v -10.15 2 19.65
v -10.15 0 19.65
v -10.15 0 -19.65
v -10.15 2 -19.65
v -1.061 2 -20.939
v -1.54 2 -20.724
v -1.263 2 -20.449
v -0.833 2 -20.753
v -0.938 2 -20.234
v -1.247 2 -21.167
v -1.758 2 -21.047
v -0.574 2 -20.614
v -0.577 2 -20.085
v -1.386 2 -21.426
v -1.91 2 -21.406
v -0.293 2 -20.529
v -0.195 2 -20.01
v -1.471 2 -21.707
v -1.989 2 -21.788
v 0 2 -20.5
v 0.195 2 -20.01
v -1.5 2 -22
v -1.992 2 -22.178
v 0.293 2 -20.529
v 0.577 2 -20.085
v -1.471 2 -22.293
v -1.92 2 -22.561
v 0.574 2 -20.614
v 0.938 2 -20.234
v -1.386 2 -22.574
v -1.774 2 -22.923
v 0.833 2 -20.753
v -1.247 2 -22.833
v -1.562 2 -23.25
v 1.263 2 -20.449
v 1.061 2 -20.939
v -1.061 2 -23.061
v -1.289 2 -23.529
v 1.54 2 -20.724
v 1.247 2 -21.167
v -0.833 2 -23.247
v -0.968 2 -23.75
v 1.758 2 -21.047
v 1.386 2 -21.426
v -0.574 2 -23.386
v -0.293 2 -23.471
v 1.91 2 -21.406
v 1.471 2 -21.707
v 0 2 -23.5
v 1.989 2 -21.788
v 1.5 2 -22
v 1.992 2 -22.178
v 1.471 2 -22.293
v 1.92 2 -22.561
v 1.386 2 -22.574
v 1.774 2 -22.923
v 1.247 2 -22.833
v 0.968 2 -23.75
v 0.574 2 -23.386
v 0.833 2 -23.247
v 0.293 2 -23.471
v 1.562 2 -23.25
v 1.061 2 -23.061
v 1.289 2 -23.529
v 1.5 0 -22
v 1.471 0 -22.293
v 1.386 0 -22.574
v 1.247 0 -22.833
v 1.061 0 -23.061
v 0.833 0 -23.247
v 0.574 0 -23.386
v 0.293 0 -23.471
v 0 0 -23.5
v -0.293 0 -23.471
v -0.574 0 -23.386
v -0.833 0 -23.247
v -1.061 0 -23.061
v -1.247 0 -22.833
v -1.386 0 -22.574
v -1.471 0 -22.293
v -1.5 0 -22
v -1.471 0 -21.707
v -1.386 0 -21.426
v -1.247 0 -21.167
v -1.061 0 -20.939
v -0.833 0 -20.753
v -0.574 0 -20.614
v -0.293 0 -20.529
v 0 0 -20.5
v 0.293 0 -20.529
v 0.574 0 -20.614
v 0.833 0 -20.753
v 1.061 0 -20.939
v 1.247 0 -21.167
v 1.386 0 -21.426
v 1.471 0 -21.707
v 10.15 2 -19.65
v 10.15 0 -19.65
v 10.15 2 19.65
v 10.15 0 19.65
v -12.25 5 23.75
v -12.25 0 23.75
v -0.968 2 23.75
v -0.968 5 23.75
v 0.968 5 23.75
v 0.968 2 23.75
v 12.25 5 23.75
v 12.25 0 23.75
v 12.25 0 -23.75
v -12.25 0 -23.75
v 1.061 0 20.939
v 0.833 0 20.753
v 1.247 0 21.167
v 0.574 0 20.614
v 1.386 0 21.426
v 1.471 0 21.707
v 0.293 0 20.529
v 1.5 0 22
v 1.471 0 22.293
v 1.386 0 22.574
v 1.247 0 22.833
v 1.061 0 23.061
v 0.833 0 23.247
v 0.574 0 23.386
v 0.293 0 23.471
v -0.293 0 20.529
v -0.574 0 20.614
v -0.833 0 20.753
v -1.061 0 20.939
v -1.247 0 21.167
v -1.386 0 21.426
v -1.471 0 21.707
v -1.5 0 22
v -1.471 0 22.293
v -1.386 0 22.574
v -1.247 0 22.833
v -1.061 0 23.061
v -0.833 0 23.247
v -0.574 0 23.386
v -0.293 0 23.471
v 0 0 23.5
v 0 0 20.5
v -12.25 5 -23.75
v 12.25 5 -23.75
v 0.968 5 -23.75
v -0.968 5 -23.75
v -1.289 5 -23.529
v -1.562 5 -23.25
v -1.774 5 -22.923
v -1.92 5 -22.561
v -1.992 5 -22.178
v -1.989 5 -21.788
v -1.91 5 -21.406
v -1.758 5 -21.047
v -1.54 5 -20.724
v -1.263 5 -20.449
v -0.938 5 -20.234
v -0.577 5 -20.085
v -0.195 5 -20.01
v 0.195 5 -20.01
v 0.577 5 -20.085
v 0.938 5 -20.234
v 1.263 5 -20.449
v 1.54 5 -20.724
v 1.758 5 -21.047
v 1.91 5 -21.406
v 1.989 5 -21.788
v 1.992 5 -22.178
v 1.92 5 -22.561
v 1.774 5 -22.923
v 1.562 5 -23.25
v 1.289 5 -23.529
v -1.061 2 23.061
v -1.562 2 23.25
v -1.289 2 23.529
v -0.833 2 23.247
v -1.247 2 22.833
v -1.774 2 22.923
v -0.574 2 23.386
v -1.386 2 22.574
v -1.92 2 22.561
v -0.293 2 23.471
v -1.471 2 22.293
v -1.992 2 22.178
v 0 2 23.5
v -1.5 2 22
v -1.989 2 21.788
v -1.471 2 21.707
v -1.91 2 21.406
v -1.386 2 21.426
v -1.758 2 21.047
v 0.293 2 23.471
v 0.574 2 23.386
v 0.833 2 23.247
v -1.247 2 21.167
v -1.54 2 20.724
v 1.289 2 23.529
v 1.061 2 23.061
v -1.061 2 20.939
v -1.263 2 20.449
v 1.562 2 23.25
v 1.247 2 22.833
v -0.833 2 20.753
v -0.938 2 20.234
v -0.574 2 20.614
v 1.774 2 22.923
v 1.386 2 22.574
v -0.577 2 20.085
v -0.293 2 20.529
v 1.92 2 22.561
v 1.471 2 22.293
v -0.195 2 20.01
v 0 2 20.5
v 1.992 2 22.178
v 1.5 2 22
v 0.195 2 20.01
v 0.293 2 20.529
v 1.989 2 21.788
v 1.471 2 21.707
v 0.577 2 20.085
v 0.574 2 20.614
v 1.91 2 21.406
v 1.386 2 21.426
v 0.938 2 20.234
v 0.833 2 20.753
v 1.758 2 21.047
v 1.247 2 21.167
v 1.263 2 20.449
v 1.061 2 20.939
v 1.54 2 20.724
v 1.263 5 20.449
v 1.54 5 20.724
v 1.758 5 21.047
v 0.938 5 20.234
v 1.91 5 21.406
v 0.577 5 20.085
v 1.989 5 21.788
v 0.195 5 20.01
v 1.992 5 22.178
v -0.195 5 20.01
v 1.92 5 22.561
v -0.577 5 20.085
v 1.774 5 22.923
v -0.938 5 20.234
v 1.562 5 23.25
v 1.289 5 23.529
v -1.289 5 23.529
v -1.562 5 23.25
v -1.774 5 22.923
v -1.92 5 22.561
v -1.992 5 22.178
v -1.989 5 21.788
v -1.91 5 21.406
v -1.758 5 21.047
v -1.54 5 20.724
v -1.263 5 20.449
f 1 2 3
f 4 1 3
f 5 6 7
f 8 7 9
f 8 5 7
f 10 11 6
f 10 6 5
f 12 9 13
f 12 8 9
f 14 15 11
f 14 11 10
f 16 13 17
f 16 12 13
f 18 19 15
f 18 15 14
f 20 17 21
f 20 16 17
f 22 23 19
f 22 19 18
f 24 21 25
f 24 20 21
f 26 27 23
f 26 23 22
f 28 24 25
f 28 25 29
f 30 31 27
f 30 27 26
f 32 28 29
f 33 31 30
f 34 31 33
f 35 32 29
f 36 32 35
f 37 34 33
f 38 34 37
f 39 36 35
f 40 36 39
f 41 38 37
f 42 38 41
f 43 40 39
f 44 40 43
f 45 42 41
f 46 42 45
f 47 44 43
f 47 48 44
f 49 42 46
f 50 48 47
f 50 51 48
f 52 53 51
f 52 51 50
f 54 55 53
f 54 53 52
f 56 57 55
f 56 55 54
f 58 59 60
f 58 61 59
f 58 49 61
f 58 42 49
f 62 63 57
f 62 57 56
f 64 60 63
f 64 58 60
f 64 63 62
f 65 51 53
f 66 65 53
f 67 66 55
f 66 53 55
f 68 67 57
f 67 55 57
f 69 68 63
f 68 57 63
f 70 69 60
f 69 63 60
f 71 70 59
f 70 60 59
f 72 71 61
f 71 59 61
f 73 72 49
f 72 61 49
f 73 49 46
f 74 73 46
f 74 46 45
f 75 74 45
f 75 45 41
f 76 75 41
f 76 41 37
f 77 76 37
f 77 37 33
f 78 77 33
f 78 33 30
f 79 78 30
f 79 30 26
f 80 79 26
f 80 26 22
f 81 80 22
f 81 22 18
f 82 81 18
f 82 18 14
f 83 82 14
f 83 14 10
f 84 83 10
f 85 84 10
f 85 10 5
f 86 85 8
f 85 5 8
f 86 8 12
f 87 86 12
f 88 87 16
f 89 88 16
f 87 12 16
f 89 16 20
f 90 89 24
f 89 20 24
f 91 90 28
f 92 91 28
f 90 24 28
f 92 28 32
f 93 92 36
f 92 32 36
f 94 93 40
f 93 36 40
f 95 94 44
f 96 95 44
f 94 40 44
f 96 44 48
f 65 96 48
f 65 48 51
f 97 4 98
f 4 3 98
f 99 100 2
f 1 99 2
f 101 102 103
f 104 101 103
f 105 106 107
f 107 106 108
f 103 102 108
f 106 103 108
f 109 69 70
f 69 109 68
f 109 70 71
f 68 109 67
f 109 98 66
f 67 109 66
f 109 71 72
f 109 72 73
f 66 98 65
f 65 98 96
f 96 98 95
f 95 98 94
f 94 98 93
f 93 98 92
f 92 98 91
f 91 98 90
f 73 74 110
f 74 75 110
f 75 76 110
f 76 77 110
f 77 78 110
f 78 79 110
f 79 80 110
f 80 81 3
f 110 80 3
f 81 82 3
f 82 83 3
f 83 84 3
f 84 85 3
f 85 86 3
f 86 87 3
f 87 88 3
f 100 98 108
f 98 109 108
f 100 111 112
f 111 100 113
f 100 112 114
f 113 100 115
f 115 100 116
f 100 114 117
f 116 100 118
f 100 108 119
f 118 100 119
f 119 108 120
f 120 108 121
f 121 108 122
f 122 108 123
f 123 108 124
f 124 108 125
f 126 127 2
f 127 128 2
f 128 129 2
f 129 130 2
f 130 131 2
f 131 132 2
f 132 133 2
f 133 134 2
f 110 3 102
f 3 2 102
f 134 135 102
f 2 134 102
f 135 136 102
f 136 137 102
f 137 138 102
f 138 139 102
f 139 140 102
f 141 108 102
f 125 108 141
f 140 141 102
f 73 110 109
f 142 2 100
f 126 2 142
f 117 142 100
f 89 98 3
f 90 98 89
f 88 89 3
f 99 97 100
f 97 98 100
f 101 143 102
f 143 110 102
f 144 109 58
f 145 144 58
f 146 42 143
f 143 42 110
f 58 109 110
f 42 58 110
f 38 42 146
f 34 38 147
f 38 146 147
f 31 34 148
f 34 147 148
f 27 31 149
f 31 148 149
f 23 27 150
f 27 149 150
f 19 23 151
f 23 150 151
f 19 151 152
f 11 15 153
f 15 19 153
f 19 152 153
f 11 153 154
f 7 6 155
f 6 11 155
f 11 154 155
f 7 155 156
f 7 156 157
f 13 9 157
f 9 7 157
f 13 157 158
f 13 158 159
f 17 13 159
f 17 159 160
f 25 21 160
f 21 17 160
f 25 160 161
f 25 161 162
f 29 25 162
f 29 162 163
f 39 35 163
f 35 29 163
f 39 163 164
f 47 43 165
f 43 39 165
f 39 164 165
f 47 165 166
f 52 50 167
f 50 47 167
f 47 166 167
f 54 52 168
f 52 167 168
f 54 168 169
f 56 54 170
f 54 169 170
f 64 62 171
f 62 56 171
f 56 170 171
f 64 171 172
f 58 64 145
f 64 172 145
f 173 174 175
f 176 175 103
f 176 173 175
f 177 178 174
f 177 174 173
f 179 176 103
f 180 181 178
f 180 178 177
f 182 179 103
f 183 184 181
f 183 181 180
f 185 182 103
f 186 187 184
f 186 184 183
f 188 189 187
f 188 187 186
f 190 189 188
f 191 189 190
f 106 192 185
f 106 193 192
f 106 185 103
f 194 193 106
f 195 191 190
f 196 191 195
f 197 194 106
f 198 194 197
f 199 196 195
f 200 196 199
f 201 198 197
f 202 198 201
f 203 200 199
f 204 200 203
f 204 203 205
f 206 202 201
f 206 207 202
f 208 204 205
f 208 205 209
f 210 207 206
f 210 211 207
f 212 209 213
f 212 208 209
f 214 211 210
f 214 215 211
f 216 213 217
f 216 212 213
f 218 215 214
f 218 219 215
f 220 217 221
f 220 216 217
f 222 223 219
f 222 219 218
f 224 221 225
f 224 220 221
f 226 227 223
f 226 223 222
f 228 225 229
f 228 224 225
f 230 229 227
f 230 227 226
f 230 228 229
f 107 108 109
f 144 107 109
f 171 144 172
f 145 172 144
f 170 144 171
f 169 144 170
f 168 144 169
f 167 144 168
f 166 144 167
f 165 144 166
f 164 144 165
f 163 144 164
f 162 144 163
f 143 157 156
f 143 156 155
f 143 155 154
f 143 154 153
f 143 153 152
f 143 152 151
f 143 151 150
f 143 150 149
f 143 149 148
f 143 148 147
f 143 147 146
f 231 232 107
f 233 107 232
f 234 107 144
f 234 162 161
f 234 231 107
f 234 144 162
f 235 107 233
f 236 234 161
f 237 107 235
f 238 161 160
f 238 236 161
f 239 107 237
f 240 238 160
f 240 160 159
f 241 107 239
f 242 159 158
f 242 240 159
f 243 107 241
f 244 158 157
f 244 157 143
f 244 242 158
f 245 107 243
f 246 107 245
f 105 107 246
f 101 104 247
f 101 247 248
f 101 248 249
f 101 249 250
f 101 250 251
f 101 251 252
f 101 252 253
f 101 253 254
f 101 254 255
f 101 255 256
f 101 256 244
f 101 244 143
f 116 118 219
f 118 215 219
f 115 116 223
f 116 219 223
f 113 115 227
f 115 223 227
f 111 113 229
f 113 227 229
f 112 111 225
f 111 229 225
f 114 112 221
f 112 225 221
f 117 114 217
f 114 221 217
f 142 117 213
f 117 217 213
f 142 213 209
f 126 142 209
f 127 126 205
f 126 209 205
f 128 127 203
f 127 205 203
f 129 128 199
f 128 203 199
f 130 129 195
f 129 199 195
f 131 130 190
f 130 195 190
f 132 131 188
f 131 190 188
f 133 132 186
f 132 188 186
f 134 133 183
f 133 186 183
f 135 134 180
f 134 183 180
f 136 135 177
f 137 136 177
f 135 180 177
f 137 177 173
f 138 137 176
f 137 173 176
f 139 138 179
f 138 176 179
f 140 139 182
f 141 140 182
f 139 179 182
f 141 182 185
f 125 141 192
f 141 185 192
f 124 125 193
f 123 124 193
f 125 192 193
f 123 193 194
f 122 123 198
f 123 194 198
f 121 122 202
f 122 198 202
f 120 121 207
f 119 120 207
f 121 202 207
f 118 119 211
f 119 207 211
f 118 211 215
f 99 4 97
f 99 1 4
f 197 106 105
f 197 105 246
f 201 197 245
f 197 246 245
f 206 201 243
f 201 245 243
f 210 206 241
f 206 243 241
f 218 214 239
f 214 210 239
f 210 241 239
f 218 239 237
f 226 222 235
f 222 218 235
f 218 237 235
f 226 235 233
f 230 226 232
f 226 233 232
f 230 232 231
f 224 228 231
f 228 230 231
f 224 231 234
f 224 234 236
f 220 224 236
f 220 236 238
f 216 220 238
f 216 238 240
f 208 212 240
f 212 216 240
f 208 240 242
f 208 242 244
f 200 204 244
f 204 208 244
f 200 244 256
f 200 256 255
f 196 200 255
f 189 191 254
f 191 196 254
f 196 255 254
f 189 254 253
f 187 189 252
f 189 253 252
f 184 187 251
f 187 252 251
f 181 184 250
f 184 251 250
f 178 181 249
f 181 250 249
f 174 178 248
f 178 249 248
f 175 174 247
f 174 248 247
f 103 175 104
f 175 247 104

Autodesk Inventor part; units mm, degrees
ref_plane "YZ Plane" through (0, 0, 0) normal (1, 0, 0) x (0, 1, 0)
ref_plane "XZ Plane" through (0, 0, 0) normal (0, 1, 0) x (-1, 0, 0)
ref_plane "XY Plane" through (0, 0, 0) normal (0, 0, 1) x (1, 0, 0)
sketch "Sketch1" plane through (0, 0, 0) normal (0, 1, 0) x (-1, 0, 0)
  line L0 (12.25, 23.75) -> (-12.25, 23.75)
  line L1 (-12.25, 23.75) -> (-12.25, -23.75)
  line L2 (-12.25, -23.75) -> (12.25, -23.75)
  line L3 (12.25, -23.75) -> (12.25, 23.75)
  point P0 (0, 0)
  dimension "d0" = 12.25
  dimension "d1" = 12.25
  dimension "d2" = 23.75
  dimension "d3" = 23.75
extrude "Extrusion1" add sketch "Sketch1" along normal blind 5
sketch "Sketch2" plane through (0, 5, 0) normal (0, 1, 0) x (1, 0, 0)
  circle A0 centre (0, -22) radius 1.5
  circle A1 centre (0, 22) radius 1.5
  point P0 (0, 0)
  dimension "d6" = 3
  dimension "d7" = 3
  dimension "d8" = 22
  dimension "d9" = 22
  dimension "d10" = 0
  dimension "d11" = 0
extrude "Extrusion2" cut sketch "Sketch2" against normal up to surface (5 mm away)
sketch "Sketch4" plane through (0, 5, 0) normal (0, 1, 0) x (1, 0, 0)
  circle A0 centre (0, -22) radius 1.5 projected
  circle A1 centre (0, 22) radius 1.5 projected
  line L0 (-12.25, -23.75) -> (12.25, -23.75) projected
  line L1 (12.25, -23.75) -> (12.25, 23.75) projected
  line L2 (12.25, 23.75) -> (-12.25, 23.75) projected
  line L3 (-12.25, 23.75) -> (-12.25, -23.75) projected
  circle A2 centre (0, -22) radius 2
  circle A3 centre (0, 22) radius 2
  point P0 (0, 0)
  dimension "d14" = 4
  dimension "d15" = 4
extrude "Extrusion3" cut sketch "Sketch4" against normal blind 3 contours A2 L0 | L0 A2 | A3 L2 | L2 A3
sketch "Sketch5" plane through (0, 0, 0) normal (0, -1, 0) x (1, 0, 0)
  line L0 (-12.25, -23.75) -> (-12.25, 23.75) projected
  line L1 (-12.25, 23.75) -> (12.25, 23.75) projected
  line L2 (12.25, -23.75) -> (-12.25, -23.75) projected
  line L3 (10.15, 19.65) -> (-10.15, 19.65)
  line L4 (-10.15, 19.65) -> (-10.15, -19.65)
  line L5 (-10.15, -19.65) -> (10.15, -19.65)
  line L6 (10.15, -19.65) -> (10.15, 19.65)
  line L7 (12.25, 23.75) -> (12.25, -23.75) projected
  point P0 (0, 0)
  dimension "d20" = 4.1
  dimension "d21" = 4.1
  dimension "d22" = 2.1
  dimension "d23" = 2.1
extrude "Extrusion4" cut sketch "Sketch5" against normal blind 2 contours L6 L5 L4 L3
equation "\"d1\" = d0"
equation "\"d3\" = d2"
equation "\"d21\" = d20"
equation "\"d23\" = d22"
properties part number "Bottom"
